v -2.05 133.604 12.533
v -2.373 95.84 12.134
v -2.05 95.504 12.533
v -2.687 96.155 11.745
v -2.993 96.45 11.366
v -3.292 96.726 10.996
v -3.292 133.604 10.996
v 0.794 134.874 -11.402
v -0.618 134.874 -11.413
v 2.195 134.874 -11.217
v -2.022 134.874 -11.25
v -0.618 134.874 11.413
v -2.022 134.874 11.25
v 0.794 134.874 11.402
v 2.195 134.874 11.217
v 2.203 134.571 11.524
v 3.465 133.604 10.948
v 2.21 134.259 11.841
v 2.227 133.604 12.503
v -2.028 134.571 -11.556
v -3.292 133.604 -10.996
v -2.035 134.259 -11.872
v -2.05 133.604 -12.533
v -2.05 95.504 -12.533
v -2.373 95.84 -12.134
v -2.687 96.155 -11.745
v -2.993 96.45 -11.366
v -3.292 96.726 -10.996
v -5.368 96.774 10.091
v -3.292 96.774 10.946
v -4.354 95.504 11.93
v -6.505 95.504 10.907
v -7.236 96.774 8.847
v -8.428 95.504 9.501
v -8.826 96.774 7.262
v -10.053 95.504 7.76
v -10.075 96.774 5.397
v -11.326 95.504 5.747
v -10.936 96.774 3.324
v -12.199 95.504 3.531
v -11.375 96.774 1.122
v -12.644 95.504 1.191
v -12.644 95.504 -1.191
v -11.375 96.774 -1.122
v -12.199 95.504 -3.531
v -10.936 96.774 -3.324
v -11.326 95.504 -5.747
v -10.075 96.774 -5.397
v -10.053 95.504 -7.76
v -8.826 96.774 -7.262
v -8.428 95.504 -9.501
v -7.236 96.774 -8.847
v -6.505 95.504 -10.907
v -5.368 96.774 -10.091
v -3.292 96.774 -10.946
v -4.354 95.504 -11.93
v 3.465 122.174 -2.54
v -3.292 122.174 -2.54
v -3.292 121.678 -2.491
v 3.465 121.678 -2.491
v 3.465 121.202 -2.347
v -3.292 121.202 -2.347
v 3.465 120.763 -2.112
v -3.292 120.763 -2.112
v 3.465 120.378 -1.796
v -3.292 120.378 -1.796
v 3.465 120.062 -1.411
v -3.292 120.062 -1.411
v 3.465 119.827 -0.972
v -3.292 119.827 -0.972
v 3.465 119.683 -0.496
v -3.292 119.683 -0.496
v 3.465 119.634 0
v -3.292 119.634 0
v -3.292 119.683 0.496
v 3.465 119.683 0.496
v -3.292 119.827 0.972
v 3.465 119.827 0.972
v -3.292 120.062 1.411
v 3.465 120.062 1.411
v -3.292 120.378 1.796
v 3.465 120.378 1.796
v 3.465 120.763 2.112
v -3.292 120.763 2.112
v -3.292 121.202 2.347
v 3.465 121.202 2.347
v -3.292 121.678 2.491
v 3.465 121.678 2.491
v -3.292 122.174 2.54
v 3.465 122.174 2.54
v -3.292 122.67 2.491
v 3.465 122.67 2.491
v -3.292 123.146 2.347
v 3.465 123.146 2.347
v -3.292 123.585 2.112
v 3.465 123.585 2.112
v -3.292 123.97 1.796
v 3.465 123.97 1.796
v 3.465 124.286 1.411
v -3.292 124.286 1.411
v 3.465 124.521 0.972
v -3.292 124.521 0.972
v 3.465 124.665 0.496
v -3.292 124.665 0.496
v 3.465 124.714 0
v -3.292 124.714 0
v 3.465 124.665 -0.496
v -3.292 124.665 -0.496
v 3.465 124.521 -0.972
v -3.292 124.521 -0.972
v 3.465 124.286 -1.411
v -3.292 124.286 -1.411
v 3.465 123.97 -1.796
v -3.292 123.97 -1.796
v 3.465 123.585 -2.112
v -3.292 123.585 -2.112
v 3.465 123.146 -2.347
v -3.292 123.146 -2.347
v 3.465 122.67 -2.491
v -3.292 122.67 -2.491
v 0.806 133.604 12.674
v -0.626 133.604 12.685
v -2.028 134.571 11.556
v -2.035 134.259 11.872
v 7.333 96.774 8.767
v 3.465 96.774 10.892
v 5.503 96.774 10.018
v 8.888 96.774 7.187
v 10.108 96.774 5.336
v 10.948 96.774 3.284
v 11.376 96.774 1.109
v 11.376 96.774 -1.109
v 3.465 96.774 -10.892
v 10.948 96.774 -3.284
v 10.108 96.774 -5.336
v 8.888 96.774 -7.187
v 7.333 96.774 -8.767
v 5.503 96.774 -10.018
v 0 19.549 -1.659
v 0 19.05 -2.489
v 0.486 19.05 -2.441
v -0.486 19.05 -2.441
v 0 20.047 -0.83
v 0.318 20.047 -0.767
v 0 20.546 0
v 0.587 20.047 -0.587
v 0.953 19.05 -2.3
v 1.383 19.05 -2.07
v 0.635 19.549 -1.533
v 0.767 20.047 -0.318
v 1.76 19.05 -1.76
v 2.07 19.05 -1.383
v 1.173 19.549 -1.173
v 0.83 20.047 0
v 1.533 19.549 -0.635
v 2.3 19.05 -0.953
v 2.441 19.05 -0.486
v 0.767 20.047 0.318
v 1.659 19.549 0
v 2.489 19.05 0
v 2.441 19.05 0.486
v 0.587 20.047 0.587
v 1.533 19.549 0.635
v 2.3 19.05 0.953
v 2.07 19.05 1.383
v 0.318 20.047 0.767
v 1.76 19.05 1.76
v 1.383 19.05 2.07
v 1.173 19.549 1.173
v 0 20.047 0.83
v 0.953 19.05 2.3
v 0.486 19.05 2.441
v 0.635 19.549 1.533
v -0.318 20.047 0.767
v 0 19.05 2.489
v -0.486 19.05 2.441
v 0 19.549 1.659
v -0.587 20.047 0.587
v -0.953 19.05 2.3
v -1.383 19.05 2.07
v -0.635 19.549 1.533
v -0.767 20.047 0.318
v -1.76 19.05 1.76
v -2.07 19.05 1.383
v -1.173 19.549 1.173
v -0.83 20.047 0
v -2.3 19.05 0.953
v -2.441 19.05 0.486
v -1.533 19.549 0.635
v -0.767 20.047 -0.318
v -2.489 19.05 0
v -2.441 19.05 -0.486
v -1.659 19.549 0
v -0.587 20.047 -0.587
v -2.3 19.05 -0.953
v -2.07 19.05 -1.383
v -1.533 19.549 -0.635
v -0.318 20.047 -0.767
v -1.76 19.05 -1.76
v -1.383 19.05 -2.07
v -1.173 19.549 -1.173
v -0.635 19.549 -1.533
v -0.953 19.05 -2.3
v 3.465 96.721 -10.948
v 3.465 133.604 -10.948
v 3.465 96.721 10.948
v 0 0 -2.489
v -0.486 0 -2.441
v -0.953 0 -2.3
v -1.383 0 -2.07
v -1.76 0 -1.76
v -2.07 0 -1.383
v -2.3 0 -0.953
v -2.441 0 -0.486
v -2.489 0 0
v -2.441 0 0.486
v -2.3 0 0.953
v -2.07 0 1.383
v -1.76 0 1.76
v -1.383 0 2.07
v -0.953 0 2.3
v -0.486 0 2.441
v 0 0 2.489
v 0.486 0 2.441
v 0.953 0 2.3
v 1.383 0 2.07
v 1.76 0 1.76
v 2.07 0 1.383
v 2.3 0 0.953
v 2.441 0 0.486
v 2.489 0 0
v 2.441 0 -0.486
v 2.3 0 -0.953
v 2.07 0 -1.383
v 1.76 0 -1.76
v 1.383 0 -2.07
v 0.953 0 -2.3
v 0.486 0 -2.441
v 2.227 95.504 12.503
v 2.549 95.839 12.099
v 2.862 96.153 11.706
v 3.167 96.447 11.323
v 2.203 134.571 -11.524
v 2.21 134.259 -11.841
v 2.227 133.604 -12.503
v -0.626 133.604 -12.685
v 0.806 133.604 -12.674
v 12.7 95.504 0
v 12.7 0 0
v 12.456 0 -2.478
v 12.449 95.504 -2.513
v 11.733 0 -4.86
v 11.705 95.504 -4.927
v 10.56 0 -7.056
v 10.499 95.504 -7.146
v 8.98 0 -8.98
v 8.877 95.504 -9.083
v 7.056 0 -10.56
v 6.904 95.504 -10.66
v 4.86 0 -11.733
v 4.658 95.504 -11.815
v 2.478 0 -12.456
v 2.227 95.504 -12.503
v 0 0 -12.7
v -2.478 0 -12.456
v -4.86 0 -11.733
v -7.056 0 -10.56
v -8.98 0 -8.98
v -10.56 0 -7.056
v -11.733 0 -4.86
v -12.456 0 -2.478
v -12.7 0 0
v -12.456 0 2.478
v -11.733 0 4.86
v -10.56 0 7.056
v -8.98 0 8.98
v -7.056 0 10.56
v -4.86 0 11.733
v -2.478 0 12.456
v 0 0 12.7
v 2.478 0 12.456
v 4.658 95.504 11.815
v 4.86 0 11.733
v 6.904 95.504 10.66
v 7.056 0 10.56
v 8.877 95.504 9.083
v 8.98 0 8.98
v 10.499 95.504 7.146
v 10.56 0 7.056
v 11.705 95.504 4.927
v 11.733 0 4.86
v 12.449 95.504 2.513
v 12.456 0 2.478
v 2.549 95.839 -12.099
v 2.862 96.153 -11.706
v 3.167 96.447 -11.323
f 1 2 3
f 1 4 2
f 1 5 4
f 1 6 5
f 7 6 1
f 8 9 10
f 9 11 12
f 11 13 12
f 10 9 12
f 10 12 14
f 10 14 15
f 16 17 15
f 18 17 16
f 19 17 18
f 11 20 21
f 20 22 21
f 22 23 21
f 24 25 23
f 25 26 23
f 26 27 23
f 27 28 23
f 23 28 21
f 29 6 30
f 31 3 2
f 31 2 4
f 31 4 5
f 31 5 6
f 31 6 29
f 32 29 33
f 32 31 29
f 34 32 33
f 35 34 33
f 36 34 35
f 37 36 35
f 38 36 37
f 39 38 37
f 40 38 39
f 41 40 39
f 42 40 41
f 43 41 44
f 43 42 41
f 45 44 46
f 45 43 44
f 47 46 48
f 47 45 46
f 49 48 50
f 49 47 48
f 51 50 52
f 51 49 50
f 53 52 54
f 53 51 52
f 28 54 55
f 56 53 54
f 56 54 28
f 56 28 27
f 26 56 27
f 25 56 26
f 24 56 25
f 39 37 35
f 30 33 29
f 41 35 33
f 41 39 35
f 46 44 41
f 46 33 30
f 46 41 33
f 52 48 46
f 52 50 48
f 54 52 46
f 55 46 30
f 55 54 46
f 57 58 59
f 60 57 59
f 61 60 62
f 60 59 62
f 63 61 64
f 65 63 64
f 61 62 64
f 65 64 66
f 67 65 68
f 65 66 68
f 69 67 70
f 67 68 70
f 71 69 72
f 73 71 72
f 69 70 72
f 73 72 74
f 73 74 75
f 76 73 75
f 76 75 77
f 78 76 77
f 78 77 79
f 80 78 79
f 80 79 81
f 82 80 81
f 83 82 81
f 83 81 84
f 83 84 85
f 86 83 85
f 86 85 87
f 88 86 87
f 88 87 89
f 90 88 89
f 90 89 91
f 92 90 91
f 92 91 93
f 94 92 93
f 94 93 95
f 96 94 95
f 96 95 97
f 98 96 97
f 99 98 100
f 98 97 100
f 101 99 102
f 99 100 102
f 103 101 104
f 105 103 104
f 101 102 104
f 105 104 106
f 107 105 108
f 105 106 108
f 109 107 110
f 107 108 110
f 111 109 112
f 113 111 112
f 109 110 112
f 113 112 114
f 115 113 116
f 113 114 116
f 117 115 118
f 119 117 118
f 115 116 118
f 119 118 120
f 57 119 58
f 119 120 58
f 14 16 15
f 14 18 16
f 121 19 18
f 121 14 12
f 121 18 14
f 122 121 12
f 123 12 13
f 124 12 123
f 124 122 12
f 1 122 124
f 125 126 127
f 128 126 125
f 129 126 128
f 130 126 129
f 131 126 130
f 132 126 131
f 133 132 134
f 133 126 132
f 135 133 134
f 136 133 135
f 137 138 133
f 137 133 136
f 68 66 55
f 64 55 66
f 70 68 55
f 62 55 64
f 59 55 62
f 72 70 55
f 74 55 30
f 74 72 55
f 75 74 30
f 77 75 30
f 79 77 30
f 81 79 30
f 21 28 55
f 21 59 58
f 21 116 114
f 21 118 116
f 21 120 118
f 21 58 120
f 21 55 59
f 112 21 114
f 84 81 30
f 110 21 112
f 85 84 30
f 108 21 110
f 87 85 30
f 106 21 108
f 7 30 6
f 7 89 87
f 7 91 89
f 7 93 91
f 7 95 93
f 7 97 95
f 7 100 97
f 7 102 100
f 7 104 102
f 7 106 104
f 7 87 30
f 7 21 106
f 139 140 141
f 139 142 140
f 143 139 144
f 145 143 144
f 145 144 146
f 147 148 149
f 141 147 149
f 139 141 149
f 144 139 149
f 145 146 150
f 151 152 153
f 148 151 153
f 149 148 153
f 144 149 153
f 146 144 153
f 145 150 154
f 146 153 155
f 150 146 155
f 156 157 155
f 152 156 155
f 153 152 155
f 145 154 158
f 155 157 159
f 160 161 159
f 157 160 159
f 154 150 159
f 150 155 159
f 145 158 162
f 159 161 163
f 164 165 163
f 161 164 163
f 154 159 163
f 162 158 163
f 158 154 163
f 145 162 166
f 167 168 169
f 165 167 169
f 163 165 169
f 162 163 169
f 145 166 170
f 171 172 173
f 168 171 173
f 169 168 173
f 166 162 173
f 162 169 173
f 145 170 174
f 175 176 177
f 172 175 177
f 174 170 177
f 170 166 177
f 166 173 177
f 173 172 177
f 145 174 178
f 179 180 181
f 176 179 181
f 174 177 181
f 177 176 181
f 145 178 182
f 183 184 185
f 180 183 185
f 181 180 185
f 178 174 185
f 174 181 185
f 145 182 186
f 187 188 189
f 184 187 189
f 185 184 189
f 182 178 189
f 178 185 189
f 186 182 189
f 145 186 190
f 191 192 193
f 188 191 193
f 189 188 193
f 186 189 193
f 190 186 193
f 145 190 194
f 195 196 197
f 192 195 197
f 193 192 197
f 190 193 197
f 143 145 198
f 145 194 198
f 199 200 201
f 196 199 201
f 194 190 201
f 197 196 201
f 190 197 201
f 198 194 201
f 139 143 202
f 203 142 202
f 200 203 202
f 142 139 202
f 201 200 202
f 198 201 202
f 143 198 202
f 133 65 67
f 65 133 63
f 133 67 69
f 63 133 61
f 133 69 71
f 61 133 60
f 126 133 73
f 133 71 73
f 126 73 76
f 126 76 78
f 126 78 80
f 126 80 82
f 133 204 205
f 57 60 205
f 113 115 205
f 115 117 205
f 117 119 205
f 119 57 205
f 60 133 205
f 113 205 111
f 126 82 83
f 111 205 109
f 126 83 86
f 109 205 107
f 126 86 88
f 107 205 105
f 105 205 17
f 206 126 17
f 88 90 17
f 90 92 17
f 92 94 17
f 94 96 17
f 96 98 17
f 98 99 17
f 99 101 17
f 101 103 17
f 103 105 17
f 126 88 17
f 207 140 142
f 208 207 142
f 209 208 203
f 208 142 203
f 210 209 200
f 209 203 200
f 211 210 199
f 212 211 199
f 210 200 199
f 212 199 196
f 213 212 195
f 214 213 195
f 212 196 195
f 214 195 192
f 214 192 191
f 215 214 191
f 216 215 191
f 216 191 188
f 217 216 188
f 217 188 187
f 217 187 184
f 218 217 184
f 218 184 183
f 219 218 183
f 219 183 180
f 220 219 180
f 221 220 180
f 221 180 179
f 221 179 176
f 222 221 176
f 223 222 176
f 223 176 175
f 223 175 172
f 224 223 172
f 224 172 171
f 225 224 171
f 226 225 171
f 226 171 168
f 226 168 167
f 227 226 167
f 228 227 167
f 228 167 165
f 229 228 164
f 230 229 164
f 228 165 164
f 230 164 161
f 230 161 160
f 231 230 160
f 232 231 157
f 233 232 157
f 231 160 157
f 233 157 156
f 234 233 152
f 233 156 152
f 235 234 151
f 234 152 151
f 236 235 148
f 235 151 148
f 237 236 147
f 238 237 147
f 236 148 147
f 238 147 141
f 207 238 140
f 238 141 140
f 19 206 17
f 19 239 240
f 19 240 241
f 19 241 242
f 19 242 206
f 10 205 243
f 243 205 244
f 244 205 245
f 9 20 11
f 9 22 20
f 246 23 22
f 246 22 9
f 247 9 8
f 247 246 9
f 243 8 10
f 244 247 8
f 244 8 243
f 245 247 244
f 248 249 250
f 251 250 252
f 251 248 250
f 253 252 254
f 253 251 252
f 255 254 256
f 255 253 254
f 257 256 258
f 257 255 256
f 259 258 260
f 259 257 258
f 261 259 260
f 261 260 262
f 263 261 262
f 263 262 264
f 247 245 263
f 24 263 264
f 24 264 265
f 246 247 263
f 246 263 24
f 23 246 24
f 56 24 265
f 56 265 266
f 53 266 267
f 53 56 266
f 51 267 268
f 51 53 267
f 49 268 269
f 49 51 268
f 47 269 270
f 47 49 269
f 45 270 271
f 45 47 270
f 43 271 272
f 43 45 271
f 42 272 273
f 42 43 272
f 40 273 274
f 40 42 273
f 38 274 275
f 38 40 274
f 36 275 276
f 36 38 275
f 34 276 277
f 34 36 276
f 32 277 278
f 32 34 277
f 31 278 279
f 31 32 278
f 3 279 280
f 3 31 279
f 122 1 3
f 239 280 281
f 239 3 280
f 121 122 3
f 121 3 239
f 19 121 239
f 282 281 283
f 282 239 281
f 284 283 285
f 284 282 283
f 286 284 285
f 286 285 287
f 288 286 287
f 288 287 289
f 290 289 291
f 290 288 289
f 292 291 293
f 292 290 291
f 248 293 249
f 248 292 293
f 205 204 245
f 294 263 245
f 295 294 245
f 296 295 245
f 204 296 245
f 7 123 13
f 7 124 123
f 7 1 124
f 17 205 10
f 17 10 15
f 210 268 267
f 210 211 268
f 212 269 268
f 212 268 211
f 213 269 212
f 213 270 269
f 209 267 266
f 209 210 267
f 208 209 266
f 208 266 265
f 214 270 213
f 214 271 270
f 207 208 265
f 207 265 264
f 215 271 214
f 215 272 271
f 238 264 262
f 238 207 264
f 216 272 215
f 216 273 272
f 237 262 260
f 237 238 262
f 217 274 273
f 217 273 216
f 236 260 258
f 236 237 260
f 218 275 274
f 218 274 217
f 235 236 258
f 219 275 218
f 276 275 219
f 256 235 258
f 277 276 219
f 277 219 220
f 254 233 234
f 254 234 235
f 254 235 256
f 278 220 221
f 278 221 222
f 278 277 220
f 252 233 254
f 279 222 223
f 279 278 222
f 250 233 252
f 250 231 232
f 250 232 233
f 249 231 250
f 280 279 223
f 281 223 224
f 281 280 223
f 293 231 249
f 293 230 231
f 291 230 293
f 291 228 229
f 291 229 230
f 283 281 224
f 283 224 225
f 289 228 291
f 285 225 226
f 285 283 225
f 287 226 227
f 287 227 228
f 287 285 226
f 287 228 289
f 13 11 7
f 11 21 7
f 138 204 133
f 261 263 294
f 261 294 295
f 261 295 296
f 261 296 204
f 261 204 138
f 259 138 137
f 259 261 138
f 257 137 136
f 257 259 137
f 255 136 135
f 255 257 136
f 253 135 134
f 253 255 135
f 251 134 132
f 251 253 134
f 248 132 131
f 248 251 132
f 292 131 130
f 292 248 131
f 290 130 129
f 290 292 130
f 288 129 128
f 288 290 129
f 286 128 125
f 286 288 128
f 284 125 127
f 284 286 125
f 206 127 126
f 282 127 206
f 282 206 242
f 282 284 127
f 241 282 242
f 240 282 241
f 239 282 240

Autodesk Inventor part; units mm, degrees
ref_plane "YZ Plane" through (0, 0, 0) normal (1, 0, 0) x (0, 1, 0)
ref_plane "XZ Plane" through (0, 0, 0) normal (0, 1, 0) x (-1, 0, 0)
ref_plane "XY Plane" through (0, 0, 0) normal (0, 0, 1) x (1, 0, 0)
sketch "Sketch1" plane through (0, 0, 0) normal (0, 0, 1) x (1, 0, 0)
  line L0 (0, 0) -> (12.7, 0)
  line L1 (12.7, 0) -> (12.7, 134.874)
  line L2 (12.7, 134.874) -> (0, 134.874)
  line L3 (0, 134.874) -> (0, 0)
  line L4 (0, 0) -> (2.54, 0)
  line L5 (2.54, 0) -> (2.54, -12.7)
  line L6 (2.54, -12.7) -> (0, -12.7)
  line L7 (0, -12.7) -> (0, 0)
  dimension "d0" = 12.7
  dimension "d1" = 134.874
  dimension "d2" = 12.7
  dimension "d3" = 2.54
revolve "Revolution1" add sketch "Sketch1" angle 360 about axis through (0, 134.874, 0) along (0, -1, 0)
sketch "Sketch4" plane through (0, 134.874, 0) normal (0, 1, 0) x (1, 0, 0)
  line L0 (3.175, -12.7) -> (3.175, 12.7)
  line L1 (3.175, 12.7) -> (-3.175, 12.7)
  line L2 (-3.175, 12.7) -> (-3.175, -12.7)
  line L3 (-3.175, -12.7) -> (3.175, -12.7)
  line L4 (3.175, -12.7) -> (-3.175, 12.7) construction
  line L5 (3.175, 12.7) -> (-3.175, -12.7) construction
  point P0 (0, 0)
  dimension "d24" = 6.35
  dimension "d25" = 25.4
sketch "Sketch5" plane through (0, 134.874, 0) normal (0, 1, 0) x (1, 0, 0)
  line L0 (-3.2918, -12.7) -> (-12.7, -12.7)
  line L1 (-12.7, -12.7) -> (-12.7, 12.7)
  line L2 (-12.7, 12.7) -> (-3.2918, 12.7)
  line L3 (-3.2918, 12.7) -> (-3.2918, -12.7)
  line L4 (3.4651, -12.7) -> (12.7, -12.7)
  line L5 (12.7, -12.7) -> (12.7, 12.7)
  line L6 (12.7, 12.7) -> (3.4651, 12.7)
  line L7 (3.4651, 12.7) -> (3.4651, -12.7)
  point P0 (0, 0)
extrude "Extrusion2" cut sketch "Sketch5" against normal blind 38.1
sketch "Sketch6" plane through (3.4651, 134.874, 12.2181) normal (1, 0, 0) x (0, 0, -1)
  line L0 (-0.4819, -134.874) -> (24.9181, -134.874) projected
  line L1 (24.4841, 0) -> (-0.0478, 0) projected
  point P0 (12.2181, -134.874)
  point P1 (12.2181, -12.7)
  dimension "d39" = 12.7
hole "Hole2" at (3.4651, 122.174, 0) direction (-1, 0, 0) diameter 5.08 end through all
chamfer "Chamfer3" distance 1.27 angle 45 12 edges at (10.1316, 96.774, -7.6578) (10.1316, 96.774, 7.6578) (3.4651, 115.824, -12.2181) (3.4651, 115.824, 12.2181) (3.4651, 134.874, 0) (0.0899, 134.874, -12.6997) (0.0899, 134.874, 12.6997) (-3.2918, 134.874, 0) (-3.2918, 115.824, -12.266) (-3.2918, 115.824, 12.266) (-12.7, 96.774, 0) (-2.54, -12.7, 0)
sketch "Sketch7" plane through (0, -12.7, 0) normal (0, -1, 0) x (1, 0, 0)
  circle A0 centre (0, 0) radius 2.54 projected
  circle A1 centre (0, 0) radius 2.54
  point P0 (0, 0)
extrude "Extrusion3" cut sketch "Sketch7" against normal blind 12.7
sketch "Sketch8" plane through (0, 0, 0) normal (0, -1, 0) x (1, 0, 0)
  point P0 (0, 0)
  point P1 (0, 0)
hole "Hole3" at (0, 0, 0) direction (0, 1, 0) diameter 4.9784 depth 19.05 tip angle 118 thread size "1/4-20 UNC" class "2B" standard "ANSI Unified Screw Threads"
properties part number "2016.07.14 magnetic height guide"
